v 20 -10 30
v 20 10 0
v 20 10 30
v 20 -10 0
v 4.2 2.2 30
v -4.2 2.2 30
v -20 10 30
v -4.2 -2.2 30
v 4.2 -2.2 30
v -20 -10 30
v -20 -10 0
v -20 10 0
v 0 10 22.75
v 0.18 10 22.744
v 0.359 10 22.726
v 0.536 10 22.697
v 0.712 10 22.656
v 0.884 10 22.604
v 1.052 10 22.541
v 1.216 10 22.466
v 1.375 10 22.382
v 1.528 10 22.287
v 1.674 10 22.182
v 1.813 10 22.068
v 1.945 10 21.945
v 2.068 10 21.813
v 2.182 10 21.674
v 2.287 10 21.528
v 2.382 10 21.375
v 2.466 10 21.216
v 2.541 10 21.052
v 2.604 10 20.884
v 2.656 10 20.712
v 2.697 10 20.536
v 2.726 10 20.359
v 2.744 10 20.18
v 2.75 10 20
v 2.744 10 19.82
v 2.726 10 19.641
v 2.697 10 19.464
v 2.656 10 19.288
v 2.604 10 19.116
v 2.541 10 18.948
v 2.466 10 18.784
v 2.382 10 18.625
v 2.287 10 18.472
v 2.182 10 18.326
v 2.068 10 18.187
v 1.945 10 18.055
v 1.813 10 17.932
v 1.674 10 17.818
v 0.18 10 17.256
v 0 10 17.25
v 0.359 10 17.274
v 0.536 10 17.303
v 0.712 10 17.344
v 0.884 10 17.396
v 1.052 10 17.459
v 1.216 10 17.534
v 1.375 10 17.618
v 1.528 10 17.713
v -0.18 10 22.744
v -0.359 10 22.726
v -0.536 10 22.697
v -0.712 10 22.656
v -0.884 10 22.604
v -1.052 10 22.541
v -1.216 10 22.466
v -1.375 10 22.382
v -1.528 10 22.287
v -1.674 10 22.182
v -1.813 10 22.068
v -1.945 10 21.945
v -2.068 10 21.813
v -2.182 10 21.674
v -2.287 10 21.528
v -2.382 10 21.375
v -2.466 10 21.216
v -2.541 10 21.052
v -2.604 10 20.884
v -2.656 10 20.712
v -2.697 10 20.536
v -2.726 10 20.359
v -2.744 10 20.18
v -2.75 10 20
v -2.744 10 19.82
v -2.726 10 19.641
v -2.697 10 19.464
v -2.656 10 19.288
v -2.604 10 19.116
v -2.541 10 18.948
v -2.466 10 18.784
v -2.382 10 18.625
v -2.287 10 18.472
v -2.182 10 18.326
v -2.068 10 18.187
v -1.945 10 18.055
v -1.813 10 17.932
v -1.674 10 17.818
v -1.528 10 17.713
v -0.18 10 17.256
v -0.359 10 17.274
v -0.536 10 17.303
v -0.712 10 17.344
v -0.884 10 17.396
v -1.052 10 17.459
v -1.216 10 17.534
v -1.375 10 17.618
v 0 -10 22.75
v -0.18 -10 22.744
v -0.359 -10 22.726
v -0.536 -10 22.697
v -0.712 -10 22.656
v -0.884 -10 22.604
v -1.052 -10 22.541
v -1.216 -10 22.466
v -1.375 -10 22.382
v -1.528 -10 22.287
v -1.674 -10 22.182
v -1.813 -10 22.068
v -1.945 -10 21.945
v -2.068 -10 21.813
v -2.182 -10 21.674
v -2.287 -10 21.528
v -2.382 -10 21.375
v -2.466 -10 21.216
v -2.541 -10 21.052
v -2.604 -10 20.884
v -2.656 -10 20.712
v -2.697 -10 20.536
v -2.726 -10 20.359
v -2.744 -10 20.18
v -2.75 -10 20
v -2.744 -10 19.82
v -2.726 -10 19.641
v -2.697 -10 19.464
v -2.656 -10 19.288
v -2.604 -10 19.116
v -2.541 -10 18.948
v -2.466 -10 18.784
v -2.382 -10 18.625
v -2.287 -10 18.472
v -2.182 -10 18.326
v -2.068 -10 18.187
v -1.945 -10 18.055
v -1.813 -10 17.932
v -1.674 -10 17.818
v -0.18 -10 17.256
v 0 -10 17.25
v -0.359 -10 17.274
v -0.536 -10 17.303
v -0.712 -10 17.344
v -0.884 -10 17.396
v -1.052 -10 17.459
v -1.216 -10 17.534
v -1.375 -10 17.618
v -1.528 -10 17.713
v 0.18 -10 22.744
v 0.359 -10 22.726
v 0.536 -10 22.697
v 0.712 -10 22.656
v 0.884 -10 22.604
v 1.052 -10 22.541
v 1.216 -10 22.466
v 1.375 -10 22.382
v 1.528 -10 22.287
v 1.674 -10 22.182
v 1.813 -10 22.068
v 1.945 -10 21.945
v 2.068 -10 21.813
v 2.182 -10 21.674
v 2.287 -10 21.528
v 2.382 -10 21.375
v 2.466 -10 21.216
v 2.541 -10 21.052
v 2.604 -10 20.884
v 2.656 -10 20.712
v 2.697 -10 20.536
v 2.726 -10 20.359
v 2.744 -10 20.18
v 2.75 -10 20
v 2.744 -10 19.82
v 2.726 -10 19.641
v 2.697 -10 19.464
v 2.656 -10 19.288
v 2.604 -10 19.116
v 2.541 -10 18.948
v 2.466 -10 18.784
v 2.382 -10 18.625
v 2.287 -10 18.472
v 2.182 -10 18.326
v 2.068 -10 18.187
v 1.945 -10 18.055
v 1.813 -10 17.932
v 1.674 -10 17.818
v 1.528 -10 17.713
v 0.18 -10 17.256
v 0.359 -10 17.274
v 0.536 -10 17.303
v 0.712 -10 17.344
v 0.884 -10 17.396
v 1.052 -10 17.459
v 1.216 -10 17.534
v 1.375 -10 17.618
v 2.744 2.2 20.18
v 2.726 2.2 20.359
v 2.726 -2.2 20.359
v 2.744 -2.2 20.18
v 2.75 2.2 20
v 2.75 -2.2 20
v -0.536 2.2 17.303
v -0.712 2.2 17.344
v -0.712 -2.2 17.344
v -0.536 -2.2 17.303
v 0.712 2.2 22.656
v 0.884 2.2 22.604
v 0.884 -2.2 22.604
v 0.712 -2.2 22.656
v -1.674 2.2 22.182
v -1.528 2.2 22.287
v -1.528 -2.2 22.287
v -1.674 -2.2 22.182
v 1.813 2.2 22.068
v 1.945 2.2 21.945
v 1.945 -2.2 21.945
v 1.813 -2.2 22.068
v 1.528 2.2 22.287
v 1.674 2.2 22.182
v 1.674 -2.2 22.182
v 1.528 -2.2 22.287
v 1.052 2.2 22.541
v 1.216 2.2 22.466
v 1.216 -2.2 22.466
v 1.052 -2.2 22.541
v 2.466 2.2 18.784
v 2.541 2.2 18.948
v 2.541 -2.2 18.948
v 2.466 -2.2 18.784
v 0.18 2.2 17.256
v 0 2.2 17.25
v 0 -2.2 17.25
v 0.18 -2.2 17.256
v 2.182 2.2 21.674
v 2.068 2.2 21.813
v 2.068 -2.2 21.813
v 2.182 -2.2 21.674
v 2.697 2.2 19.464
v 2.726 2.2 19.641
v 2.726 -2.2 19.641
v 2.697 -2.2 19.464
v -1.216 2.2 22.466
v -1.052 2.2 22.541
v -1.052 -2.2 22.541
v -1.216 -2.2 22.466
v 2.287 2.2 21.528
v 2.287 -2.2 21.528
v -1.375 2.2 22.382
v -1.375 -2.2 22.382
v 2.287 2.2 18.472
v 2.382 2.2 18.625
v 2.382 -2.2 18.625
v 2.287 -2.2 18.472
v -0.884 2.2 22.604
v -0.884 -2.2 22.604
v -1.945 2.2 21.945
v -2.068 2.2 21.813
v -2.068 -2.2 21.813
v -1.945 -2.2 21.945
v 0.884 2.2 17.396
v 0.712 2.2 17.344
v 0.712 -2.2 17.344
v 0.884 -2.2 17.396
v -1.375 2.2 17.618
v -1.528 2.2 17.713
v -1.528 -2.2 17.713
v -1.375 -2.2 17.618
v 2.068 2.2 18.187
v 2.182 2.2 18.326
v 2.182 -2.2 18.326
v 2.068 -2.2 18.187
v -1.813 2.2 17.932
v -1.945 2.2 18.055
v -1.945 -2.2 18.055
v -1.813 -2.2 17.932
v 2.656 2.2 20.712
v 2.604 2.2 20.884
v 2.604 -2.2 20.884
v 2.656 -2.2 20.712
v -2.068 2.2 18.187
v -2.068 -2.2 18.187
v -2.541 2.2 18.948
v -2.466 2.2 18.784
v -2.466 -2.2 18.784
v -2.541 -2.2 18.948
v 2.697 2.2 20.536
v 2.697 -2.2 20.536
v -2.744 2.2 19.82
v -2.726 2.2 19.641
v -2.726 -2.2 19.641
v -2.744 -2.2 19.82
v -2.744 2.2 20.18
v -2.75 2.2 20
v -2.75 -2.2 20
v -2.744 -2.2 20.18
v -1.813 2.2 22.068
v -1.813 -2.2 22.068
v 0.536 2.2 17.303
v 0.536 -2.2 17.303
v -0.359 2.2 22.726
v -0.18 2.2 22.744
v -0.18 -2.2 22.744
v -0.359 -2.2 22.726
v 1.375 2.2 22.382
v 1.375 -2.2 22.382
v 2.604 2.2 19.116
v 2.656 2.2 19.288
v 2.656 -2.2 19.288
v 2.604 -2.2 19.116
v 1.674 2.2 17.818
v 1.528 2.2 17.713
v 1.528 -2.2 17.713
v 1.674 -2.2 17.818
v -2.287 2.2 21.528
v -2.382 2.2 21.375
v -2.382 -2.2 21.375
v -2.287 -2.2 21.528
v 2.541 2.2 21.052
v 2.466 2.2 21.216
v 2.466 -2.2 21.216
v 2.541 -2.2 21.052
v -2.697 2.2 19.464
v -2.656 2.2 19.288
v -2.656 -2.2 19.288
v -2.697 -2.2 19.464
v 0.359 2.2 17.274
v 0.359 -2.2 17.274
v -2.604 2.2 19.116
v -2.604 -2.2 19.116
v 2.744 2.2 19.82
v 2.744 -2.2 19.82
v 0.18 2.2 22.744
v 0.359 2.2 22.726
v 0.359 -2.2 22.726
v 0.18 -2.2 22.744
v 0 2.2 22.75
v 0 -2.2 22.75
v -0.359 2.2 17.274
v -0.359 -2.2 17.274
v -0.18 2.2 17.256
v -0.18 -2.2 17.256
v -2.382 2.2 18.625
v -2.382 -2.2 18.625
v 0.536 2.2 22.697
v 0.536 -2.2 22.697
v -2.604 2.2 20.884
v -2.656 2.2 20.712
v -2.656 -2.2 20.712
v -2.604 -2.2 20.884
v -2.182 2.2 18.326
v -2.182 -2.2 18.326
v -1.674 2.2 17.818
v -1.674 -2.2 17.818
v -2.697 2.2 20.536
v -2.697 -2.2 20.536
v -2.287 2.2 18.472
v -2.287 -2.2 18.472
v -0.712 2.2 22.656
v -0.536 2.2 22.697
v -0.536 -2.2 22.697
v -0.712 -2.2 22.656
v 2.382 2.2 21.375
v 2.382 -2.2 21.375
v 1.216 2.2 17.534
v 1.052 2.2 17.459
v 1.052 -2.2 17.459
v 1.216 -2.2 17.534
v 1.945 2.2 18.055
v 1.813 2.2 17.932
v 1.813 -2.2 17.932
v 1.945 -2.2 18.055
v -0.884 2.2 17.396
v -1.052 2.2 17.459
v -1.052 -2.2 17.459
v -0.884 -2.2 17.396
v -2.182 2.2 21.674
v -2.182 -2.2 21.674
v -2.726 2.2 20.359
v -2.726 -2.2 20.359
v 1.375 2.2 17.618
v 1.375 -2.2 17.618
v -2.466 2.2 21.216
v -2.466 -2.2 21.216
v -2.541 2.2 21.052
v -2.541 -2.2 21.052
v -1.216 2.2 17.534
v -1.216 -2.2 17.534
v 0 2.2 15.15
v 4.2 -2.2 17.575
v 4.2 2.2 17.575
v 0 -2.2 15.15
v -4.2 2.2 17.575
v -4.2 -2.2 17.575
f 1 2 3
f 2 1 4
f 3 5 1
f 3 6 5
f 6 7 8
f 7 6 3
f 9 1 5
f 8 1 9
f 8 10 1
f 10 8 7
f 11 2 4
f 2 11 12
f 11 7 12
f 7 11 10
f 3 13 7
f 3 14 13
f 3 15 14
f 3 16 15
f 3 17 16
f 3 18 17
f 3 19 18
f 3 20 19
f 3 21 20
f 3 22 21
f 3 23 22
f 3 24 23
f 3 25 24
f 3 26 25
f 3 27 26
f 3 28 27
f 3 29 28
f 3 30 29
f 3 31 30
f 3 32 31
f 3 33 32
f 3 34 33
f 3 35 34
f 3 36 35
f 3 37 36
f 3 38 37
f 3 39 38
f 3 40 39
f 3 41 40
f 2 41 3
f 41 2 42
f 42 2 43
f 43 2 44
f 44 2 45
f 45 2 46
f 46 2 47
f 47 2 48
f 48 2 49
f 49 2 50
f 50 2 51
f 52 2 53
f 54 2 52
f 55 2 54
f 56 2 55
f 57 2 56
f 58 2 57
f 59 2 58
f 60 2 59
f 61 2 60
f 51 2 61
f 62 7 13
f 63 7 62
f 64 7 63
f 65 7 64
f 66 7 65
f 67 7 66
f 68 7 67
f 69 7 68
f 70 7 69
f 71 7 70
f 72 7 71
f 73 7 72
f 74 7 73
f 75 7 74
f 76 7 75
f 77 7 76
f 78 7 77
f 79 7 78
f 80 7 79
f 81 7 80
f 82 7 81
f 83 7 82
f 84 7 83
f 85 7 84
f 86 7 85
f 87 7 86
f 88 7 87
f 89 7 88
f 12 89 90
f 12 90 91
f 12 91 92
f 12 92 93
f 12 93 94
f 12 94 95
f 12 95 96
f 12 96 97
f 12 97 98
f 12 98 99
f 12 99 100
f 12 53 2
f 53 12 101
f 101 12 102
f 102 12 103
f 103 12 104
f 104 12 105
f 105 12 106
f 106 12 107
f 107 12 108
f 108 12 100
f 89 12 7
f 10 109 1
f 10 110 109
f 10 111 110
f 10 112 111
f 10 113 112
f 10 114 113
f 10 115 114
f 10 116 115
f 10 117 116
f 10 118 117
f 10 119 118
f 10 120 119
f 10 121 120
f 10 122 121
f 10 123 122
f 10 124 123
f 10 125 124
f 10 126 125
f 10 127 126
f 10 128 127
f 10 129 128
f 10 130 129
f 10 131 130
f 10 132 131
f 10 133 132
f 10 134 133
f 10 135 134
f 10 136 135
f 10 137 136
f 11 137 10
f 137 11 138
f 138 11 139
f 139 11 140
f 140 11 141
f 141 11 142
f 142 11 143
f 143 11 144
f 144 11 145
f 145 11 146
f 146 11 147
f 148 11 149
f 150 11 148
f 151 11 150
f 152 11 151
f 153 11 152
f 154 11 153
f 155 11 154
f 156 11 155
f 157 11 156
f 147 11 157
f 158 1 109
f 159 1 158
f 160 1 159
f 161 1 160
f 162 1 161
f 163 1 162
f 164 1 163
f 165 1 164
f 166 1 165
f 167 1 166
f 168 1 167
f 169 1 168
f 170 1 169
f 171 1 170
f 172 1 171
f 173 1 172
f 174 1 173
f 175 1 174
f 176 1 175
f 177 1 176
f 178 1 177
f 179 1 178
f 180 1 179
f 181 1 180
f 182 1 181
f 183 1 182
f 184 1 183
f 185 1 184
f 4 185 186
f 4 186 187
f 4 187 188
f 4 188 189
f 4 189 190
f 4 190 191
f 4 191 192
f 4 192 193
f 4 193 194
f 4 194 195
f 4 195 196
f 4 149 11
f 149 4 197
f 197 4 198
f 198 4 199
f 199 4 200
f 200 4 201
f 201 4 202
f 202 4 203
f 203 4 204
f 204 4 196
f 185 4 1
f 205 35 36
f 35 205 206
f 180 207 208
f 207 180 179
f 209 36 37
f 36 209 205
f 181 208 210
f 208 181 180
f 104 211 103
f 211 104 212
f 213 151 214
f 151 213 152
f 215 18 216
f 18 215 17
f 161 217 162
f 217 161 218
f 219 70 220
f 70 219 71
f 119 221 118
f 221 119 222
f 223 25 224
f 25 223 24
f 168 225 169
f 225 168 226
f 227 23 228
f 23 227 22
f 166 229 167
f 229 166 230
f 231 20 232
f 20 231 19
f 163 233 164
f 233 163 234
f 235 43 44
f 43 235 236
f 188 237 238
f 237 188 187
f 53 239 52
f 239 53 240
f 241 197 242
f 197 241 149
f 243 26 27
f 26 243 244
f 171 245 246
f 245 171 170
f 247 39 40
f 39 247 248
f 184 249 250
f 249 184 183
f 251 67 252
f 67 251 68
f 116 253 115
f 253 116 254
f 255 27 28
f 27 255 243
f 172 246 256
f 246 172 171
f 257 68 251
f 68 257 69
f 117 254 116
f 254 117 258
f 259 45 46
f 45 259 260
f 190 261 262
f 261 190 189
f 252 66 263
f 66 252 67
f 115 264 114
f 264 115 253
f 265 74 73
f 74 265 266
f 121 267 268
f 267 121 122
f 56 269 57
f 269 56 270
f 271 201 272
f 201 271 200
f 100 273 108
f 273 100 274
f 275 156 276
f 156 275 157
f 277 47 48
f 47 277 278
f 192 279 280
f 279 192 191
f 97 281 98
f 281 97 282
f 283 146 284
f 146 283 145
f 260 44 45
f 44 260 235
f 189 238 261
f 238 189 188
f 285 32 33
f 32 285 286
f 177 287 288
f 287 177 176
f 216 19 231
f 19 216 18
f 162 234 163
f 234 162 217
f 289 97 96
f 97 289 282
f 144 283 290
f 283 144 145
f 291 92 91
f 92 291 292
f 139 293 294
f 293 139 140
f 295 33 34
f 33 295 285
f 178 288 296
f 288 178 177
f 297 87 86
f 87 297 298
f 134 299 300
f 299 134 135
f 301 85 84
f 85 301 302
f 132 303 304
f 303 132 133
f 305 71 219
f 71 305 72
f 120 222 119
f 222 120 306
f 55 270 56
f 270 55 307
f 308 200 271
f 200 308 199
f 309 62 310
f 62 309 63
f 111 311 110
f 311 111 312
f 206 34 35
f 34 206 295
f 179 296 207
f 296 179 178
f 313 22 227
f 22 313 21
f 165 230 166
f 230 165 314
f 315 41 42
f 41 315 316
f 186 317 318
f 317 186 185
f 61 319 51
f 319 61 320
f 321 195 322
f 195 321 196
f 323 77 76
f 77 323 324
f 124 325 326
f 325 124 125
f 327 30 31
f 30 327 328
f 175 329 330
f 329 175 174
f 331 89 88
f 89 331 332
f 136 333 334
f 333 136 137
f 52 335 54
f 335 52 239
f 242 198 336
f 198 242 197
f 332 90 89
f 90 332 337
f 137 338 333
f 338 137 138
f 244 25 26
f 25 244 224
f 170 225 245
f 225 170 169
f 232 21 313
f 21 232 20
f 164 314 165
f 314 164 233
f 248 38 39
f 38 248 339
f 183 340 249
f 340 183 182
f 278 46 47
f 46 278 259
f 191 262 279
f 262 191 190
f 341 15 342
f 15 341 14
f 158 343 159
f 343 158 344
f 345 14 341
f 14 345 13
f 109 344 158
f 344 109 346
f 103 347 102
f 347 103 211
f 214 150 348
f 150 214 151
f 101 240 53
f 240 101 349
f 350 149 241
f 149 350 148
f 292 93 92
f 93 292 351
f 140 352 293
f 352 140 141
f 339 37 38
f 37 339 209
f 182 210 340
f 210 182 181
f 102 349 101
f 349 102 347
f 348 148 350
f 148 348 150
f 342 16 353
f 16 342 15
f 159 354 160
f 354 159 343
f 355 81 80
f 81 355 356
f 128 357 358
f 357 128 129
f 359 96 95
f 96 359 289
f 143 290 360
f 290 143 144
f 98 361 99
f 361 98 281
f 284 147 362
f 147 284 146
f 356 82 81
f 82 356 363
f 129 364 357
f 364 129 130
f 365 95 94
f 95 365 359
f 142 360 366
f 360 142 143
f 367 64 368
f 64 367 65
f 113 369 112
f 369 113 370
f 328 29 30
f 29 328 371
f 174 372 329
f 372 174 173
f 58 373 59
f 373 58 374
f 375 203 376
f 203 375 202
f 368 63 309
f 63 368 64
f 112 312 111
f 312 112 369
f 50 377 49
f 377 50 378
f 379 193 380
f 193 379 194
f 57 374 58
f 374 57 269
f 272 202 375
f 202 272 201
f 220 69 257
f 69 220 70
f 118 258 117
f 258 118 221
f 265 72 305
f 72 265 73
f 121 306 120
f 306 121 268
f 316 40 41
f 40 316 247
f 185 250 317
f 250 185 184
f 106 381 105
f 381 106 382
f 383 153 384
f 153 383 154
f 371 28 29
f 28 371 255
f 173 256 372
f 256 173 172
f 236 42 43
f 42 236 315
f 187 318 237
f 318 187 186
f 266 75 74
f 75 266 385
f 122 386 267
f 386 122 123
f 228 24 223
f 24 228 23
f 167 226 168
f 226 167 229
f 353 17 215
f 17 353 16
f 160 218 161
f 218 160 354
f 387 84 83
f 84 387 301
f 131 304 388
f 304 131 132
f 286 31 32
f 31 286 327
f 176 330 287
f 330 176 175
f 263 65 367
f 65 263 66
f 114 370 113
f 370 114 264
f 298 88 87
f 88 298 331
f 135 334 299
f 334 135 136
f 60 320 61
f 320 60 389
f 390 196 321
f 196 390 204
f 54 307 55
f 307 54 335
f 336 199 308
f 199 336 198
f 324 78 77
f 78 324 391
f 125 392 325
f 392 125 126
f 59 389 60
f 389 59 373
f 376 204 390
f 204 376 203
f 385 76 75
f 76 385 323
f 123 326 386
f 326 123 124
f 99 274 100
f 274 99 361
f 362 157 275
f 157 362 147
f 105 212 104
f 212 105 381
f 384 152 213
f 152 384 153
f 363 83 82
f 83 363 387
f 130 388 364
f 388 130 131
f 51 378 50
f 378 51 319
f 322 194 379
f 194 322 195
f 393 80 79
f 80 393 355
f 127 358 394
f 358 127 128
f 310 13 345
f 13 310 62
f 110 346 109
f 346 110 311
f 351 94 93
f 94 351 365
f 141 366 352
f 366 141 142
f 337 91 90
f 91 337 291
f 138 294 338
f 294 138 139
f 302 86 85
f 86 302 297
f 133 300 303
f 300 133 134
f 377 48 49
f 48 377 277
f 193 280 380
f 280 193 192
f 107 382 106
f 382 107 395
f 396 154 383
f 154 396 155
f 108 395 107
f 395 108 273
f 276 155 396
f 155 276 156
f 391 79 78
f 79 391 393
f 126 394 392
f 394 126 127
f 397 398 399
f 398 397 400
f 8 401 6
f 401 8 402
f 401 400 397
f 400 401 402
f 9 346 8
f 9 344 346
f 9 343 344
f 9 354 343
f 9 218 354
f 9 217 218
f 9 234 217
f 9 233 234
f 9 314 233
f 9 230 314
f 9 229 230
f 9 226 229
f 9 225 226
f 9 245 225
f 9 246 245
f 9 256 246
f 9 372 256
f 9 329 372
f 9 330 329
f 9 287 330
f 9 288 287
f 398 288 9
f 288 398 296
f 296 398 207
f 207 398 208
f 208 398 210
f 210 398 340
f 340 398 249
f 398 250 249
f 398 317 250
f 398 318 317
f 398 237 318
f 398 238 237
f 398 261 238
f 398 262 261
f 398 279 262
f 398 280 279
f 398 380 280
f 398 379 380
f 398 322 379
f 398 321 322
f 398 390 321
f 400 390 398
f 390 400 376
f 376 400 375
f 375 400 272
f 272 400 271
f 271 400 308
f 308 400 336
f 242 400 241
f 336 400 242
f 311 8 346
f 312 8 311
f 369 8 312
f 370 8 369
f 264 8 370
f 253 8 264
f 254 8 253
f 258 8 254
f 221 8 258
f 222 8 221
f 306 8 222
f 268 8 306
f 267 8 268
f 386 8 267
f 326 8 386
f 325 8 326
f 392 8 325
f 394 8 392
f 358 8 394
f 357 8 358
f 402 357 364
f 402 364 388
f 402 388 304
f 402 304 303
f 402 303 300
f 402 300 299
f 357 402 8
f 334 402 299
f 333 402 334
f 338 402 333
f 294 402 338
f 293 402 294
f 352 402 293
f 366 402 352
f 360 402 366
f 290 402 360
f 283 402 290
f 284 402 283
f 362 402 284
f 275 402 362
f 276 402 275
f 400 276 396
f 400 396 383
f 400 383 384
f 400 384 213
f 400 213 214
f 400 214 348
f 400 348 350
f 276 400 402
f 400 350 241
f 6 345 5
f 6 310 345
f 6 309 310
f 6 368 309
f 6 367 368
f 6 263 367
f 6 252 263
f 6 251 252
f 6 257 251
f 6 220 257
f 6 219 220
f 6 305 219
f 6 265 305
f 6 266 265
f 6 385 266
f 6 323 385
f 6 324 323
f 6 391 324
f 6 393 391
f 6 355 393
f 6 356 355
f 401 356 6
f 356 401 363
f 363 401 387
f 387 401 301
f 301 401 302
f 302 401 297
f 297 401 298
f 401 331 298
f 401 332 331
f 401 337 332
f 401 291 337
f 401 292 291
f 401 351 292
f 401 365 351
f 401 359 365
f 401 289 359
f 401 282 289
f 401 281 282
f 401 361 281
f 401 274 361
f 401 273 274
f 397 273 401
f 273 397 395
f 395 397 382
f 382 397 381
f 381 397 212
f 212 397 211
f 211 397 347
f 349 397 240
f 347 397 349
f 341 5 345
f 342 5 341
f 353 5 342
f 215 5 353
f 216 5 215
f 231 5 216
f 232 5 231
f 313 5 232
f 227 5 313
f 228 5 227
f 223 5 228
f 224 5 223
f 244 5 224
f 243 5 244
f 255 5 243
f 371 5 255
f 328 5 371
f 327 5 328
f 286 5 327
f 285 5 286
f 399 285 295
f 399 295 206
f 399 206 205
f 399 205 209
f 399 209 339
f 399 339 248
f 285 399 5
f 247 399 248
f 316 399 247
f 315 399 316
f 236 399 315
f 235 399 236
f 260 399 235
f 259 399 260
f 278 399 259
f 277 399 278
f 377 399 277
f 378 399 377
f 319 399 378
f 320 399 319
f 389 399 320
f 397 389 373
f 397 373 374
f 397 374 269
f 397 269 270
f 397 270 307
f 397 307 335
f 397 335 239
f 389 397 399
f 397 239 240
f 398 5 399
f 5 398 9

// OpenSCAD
// Nut-trap bracket: horizontal M5 clearance hole, hex pocket for an M5 nut
// with a drop-in slot from the top. Plain round hole (reference, no DfAM).
$fn = 96;
bolt_hole_diameter = 5.5;
nut_across_flats = 8.4;
nut_pocket_thickness = 4.4;
axis_z = 20;
difference() {
    translate([-20, -10, 0]) cube([40, 20, 30]);
    translate([0, 0, axis_z]) rotate([90, 0, 0]) cylinder(d = bolt_hole_diameter, h = 22, center = true);
    // hex pocket, flats vertical so the 8.4 mm across-flats runs along X
    translate([0, 0, axis_z]) rotate([90, 0, 0]) rotate([0, 0, 30])
        cylinder(d = nut_across_flats / cos(30), h = nut_pocket_thickness, center = true, $fn = 6);
    translate([-nut_across_flats / 2, -nut_pocket_thickness / 2, axis_z]) cube([nut_across_flats, nut_pocket_thickness, 11]);
}
